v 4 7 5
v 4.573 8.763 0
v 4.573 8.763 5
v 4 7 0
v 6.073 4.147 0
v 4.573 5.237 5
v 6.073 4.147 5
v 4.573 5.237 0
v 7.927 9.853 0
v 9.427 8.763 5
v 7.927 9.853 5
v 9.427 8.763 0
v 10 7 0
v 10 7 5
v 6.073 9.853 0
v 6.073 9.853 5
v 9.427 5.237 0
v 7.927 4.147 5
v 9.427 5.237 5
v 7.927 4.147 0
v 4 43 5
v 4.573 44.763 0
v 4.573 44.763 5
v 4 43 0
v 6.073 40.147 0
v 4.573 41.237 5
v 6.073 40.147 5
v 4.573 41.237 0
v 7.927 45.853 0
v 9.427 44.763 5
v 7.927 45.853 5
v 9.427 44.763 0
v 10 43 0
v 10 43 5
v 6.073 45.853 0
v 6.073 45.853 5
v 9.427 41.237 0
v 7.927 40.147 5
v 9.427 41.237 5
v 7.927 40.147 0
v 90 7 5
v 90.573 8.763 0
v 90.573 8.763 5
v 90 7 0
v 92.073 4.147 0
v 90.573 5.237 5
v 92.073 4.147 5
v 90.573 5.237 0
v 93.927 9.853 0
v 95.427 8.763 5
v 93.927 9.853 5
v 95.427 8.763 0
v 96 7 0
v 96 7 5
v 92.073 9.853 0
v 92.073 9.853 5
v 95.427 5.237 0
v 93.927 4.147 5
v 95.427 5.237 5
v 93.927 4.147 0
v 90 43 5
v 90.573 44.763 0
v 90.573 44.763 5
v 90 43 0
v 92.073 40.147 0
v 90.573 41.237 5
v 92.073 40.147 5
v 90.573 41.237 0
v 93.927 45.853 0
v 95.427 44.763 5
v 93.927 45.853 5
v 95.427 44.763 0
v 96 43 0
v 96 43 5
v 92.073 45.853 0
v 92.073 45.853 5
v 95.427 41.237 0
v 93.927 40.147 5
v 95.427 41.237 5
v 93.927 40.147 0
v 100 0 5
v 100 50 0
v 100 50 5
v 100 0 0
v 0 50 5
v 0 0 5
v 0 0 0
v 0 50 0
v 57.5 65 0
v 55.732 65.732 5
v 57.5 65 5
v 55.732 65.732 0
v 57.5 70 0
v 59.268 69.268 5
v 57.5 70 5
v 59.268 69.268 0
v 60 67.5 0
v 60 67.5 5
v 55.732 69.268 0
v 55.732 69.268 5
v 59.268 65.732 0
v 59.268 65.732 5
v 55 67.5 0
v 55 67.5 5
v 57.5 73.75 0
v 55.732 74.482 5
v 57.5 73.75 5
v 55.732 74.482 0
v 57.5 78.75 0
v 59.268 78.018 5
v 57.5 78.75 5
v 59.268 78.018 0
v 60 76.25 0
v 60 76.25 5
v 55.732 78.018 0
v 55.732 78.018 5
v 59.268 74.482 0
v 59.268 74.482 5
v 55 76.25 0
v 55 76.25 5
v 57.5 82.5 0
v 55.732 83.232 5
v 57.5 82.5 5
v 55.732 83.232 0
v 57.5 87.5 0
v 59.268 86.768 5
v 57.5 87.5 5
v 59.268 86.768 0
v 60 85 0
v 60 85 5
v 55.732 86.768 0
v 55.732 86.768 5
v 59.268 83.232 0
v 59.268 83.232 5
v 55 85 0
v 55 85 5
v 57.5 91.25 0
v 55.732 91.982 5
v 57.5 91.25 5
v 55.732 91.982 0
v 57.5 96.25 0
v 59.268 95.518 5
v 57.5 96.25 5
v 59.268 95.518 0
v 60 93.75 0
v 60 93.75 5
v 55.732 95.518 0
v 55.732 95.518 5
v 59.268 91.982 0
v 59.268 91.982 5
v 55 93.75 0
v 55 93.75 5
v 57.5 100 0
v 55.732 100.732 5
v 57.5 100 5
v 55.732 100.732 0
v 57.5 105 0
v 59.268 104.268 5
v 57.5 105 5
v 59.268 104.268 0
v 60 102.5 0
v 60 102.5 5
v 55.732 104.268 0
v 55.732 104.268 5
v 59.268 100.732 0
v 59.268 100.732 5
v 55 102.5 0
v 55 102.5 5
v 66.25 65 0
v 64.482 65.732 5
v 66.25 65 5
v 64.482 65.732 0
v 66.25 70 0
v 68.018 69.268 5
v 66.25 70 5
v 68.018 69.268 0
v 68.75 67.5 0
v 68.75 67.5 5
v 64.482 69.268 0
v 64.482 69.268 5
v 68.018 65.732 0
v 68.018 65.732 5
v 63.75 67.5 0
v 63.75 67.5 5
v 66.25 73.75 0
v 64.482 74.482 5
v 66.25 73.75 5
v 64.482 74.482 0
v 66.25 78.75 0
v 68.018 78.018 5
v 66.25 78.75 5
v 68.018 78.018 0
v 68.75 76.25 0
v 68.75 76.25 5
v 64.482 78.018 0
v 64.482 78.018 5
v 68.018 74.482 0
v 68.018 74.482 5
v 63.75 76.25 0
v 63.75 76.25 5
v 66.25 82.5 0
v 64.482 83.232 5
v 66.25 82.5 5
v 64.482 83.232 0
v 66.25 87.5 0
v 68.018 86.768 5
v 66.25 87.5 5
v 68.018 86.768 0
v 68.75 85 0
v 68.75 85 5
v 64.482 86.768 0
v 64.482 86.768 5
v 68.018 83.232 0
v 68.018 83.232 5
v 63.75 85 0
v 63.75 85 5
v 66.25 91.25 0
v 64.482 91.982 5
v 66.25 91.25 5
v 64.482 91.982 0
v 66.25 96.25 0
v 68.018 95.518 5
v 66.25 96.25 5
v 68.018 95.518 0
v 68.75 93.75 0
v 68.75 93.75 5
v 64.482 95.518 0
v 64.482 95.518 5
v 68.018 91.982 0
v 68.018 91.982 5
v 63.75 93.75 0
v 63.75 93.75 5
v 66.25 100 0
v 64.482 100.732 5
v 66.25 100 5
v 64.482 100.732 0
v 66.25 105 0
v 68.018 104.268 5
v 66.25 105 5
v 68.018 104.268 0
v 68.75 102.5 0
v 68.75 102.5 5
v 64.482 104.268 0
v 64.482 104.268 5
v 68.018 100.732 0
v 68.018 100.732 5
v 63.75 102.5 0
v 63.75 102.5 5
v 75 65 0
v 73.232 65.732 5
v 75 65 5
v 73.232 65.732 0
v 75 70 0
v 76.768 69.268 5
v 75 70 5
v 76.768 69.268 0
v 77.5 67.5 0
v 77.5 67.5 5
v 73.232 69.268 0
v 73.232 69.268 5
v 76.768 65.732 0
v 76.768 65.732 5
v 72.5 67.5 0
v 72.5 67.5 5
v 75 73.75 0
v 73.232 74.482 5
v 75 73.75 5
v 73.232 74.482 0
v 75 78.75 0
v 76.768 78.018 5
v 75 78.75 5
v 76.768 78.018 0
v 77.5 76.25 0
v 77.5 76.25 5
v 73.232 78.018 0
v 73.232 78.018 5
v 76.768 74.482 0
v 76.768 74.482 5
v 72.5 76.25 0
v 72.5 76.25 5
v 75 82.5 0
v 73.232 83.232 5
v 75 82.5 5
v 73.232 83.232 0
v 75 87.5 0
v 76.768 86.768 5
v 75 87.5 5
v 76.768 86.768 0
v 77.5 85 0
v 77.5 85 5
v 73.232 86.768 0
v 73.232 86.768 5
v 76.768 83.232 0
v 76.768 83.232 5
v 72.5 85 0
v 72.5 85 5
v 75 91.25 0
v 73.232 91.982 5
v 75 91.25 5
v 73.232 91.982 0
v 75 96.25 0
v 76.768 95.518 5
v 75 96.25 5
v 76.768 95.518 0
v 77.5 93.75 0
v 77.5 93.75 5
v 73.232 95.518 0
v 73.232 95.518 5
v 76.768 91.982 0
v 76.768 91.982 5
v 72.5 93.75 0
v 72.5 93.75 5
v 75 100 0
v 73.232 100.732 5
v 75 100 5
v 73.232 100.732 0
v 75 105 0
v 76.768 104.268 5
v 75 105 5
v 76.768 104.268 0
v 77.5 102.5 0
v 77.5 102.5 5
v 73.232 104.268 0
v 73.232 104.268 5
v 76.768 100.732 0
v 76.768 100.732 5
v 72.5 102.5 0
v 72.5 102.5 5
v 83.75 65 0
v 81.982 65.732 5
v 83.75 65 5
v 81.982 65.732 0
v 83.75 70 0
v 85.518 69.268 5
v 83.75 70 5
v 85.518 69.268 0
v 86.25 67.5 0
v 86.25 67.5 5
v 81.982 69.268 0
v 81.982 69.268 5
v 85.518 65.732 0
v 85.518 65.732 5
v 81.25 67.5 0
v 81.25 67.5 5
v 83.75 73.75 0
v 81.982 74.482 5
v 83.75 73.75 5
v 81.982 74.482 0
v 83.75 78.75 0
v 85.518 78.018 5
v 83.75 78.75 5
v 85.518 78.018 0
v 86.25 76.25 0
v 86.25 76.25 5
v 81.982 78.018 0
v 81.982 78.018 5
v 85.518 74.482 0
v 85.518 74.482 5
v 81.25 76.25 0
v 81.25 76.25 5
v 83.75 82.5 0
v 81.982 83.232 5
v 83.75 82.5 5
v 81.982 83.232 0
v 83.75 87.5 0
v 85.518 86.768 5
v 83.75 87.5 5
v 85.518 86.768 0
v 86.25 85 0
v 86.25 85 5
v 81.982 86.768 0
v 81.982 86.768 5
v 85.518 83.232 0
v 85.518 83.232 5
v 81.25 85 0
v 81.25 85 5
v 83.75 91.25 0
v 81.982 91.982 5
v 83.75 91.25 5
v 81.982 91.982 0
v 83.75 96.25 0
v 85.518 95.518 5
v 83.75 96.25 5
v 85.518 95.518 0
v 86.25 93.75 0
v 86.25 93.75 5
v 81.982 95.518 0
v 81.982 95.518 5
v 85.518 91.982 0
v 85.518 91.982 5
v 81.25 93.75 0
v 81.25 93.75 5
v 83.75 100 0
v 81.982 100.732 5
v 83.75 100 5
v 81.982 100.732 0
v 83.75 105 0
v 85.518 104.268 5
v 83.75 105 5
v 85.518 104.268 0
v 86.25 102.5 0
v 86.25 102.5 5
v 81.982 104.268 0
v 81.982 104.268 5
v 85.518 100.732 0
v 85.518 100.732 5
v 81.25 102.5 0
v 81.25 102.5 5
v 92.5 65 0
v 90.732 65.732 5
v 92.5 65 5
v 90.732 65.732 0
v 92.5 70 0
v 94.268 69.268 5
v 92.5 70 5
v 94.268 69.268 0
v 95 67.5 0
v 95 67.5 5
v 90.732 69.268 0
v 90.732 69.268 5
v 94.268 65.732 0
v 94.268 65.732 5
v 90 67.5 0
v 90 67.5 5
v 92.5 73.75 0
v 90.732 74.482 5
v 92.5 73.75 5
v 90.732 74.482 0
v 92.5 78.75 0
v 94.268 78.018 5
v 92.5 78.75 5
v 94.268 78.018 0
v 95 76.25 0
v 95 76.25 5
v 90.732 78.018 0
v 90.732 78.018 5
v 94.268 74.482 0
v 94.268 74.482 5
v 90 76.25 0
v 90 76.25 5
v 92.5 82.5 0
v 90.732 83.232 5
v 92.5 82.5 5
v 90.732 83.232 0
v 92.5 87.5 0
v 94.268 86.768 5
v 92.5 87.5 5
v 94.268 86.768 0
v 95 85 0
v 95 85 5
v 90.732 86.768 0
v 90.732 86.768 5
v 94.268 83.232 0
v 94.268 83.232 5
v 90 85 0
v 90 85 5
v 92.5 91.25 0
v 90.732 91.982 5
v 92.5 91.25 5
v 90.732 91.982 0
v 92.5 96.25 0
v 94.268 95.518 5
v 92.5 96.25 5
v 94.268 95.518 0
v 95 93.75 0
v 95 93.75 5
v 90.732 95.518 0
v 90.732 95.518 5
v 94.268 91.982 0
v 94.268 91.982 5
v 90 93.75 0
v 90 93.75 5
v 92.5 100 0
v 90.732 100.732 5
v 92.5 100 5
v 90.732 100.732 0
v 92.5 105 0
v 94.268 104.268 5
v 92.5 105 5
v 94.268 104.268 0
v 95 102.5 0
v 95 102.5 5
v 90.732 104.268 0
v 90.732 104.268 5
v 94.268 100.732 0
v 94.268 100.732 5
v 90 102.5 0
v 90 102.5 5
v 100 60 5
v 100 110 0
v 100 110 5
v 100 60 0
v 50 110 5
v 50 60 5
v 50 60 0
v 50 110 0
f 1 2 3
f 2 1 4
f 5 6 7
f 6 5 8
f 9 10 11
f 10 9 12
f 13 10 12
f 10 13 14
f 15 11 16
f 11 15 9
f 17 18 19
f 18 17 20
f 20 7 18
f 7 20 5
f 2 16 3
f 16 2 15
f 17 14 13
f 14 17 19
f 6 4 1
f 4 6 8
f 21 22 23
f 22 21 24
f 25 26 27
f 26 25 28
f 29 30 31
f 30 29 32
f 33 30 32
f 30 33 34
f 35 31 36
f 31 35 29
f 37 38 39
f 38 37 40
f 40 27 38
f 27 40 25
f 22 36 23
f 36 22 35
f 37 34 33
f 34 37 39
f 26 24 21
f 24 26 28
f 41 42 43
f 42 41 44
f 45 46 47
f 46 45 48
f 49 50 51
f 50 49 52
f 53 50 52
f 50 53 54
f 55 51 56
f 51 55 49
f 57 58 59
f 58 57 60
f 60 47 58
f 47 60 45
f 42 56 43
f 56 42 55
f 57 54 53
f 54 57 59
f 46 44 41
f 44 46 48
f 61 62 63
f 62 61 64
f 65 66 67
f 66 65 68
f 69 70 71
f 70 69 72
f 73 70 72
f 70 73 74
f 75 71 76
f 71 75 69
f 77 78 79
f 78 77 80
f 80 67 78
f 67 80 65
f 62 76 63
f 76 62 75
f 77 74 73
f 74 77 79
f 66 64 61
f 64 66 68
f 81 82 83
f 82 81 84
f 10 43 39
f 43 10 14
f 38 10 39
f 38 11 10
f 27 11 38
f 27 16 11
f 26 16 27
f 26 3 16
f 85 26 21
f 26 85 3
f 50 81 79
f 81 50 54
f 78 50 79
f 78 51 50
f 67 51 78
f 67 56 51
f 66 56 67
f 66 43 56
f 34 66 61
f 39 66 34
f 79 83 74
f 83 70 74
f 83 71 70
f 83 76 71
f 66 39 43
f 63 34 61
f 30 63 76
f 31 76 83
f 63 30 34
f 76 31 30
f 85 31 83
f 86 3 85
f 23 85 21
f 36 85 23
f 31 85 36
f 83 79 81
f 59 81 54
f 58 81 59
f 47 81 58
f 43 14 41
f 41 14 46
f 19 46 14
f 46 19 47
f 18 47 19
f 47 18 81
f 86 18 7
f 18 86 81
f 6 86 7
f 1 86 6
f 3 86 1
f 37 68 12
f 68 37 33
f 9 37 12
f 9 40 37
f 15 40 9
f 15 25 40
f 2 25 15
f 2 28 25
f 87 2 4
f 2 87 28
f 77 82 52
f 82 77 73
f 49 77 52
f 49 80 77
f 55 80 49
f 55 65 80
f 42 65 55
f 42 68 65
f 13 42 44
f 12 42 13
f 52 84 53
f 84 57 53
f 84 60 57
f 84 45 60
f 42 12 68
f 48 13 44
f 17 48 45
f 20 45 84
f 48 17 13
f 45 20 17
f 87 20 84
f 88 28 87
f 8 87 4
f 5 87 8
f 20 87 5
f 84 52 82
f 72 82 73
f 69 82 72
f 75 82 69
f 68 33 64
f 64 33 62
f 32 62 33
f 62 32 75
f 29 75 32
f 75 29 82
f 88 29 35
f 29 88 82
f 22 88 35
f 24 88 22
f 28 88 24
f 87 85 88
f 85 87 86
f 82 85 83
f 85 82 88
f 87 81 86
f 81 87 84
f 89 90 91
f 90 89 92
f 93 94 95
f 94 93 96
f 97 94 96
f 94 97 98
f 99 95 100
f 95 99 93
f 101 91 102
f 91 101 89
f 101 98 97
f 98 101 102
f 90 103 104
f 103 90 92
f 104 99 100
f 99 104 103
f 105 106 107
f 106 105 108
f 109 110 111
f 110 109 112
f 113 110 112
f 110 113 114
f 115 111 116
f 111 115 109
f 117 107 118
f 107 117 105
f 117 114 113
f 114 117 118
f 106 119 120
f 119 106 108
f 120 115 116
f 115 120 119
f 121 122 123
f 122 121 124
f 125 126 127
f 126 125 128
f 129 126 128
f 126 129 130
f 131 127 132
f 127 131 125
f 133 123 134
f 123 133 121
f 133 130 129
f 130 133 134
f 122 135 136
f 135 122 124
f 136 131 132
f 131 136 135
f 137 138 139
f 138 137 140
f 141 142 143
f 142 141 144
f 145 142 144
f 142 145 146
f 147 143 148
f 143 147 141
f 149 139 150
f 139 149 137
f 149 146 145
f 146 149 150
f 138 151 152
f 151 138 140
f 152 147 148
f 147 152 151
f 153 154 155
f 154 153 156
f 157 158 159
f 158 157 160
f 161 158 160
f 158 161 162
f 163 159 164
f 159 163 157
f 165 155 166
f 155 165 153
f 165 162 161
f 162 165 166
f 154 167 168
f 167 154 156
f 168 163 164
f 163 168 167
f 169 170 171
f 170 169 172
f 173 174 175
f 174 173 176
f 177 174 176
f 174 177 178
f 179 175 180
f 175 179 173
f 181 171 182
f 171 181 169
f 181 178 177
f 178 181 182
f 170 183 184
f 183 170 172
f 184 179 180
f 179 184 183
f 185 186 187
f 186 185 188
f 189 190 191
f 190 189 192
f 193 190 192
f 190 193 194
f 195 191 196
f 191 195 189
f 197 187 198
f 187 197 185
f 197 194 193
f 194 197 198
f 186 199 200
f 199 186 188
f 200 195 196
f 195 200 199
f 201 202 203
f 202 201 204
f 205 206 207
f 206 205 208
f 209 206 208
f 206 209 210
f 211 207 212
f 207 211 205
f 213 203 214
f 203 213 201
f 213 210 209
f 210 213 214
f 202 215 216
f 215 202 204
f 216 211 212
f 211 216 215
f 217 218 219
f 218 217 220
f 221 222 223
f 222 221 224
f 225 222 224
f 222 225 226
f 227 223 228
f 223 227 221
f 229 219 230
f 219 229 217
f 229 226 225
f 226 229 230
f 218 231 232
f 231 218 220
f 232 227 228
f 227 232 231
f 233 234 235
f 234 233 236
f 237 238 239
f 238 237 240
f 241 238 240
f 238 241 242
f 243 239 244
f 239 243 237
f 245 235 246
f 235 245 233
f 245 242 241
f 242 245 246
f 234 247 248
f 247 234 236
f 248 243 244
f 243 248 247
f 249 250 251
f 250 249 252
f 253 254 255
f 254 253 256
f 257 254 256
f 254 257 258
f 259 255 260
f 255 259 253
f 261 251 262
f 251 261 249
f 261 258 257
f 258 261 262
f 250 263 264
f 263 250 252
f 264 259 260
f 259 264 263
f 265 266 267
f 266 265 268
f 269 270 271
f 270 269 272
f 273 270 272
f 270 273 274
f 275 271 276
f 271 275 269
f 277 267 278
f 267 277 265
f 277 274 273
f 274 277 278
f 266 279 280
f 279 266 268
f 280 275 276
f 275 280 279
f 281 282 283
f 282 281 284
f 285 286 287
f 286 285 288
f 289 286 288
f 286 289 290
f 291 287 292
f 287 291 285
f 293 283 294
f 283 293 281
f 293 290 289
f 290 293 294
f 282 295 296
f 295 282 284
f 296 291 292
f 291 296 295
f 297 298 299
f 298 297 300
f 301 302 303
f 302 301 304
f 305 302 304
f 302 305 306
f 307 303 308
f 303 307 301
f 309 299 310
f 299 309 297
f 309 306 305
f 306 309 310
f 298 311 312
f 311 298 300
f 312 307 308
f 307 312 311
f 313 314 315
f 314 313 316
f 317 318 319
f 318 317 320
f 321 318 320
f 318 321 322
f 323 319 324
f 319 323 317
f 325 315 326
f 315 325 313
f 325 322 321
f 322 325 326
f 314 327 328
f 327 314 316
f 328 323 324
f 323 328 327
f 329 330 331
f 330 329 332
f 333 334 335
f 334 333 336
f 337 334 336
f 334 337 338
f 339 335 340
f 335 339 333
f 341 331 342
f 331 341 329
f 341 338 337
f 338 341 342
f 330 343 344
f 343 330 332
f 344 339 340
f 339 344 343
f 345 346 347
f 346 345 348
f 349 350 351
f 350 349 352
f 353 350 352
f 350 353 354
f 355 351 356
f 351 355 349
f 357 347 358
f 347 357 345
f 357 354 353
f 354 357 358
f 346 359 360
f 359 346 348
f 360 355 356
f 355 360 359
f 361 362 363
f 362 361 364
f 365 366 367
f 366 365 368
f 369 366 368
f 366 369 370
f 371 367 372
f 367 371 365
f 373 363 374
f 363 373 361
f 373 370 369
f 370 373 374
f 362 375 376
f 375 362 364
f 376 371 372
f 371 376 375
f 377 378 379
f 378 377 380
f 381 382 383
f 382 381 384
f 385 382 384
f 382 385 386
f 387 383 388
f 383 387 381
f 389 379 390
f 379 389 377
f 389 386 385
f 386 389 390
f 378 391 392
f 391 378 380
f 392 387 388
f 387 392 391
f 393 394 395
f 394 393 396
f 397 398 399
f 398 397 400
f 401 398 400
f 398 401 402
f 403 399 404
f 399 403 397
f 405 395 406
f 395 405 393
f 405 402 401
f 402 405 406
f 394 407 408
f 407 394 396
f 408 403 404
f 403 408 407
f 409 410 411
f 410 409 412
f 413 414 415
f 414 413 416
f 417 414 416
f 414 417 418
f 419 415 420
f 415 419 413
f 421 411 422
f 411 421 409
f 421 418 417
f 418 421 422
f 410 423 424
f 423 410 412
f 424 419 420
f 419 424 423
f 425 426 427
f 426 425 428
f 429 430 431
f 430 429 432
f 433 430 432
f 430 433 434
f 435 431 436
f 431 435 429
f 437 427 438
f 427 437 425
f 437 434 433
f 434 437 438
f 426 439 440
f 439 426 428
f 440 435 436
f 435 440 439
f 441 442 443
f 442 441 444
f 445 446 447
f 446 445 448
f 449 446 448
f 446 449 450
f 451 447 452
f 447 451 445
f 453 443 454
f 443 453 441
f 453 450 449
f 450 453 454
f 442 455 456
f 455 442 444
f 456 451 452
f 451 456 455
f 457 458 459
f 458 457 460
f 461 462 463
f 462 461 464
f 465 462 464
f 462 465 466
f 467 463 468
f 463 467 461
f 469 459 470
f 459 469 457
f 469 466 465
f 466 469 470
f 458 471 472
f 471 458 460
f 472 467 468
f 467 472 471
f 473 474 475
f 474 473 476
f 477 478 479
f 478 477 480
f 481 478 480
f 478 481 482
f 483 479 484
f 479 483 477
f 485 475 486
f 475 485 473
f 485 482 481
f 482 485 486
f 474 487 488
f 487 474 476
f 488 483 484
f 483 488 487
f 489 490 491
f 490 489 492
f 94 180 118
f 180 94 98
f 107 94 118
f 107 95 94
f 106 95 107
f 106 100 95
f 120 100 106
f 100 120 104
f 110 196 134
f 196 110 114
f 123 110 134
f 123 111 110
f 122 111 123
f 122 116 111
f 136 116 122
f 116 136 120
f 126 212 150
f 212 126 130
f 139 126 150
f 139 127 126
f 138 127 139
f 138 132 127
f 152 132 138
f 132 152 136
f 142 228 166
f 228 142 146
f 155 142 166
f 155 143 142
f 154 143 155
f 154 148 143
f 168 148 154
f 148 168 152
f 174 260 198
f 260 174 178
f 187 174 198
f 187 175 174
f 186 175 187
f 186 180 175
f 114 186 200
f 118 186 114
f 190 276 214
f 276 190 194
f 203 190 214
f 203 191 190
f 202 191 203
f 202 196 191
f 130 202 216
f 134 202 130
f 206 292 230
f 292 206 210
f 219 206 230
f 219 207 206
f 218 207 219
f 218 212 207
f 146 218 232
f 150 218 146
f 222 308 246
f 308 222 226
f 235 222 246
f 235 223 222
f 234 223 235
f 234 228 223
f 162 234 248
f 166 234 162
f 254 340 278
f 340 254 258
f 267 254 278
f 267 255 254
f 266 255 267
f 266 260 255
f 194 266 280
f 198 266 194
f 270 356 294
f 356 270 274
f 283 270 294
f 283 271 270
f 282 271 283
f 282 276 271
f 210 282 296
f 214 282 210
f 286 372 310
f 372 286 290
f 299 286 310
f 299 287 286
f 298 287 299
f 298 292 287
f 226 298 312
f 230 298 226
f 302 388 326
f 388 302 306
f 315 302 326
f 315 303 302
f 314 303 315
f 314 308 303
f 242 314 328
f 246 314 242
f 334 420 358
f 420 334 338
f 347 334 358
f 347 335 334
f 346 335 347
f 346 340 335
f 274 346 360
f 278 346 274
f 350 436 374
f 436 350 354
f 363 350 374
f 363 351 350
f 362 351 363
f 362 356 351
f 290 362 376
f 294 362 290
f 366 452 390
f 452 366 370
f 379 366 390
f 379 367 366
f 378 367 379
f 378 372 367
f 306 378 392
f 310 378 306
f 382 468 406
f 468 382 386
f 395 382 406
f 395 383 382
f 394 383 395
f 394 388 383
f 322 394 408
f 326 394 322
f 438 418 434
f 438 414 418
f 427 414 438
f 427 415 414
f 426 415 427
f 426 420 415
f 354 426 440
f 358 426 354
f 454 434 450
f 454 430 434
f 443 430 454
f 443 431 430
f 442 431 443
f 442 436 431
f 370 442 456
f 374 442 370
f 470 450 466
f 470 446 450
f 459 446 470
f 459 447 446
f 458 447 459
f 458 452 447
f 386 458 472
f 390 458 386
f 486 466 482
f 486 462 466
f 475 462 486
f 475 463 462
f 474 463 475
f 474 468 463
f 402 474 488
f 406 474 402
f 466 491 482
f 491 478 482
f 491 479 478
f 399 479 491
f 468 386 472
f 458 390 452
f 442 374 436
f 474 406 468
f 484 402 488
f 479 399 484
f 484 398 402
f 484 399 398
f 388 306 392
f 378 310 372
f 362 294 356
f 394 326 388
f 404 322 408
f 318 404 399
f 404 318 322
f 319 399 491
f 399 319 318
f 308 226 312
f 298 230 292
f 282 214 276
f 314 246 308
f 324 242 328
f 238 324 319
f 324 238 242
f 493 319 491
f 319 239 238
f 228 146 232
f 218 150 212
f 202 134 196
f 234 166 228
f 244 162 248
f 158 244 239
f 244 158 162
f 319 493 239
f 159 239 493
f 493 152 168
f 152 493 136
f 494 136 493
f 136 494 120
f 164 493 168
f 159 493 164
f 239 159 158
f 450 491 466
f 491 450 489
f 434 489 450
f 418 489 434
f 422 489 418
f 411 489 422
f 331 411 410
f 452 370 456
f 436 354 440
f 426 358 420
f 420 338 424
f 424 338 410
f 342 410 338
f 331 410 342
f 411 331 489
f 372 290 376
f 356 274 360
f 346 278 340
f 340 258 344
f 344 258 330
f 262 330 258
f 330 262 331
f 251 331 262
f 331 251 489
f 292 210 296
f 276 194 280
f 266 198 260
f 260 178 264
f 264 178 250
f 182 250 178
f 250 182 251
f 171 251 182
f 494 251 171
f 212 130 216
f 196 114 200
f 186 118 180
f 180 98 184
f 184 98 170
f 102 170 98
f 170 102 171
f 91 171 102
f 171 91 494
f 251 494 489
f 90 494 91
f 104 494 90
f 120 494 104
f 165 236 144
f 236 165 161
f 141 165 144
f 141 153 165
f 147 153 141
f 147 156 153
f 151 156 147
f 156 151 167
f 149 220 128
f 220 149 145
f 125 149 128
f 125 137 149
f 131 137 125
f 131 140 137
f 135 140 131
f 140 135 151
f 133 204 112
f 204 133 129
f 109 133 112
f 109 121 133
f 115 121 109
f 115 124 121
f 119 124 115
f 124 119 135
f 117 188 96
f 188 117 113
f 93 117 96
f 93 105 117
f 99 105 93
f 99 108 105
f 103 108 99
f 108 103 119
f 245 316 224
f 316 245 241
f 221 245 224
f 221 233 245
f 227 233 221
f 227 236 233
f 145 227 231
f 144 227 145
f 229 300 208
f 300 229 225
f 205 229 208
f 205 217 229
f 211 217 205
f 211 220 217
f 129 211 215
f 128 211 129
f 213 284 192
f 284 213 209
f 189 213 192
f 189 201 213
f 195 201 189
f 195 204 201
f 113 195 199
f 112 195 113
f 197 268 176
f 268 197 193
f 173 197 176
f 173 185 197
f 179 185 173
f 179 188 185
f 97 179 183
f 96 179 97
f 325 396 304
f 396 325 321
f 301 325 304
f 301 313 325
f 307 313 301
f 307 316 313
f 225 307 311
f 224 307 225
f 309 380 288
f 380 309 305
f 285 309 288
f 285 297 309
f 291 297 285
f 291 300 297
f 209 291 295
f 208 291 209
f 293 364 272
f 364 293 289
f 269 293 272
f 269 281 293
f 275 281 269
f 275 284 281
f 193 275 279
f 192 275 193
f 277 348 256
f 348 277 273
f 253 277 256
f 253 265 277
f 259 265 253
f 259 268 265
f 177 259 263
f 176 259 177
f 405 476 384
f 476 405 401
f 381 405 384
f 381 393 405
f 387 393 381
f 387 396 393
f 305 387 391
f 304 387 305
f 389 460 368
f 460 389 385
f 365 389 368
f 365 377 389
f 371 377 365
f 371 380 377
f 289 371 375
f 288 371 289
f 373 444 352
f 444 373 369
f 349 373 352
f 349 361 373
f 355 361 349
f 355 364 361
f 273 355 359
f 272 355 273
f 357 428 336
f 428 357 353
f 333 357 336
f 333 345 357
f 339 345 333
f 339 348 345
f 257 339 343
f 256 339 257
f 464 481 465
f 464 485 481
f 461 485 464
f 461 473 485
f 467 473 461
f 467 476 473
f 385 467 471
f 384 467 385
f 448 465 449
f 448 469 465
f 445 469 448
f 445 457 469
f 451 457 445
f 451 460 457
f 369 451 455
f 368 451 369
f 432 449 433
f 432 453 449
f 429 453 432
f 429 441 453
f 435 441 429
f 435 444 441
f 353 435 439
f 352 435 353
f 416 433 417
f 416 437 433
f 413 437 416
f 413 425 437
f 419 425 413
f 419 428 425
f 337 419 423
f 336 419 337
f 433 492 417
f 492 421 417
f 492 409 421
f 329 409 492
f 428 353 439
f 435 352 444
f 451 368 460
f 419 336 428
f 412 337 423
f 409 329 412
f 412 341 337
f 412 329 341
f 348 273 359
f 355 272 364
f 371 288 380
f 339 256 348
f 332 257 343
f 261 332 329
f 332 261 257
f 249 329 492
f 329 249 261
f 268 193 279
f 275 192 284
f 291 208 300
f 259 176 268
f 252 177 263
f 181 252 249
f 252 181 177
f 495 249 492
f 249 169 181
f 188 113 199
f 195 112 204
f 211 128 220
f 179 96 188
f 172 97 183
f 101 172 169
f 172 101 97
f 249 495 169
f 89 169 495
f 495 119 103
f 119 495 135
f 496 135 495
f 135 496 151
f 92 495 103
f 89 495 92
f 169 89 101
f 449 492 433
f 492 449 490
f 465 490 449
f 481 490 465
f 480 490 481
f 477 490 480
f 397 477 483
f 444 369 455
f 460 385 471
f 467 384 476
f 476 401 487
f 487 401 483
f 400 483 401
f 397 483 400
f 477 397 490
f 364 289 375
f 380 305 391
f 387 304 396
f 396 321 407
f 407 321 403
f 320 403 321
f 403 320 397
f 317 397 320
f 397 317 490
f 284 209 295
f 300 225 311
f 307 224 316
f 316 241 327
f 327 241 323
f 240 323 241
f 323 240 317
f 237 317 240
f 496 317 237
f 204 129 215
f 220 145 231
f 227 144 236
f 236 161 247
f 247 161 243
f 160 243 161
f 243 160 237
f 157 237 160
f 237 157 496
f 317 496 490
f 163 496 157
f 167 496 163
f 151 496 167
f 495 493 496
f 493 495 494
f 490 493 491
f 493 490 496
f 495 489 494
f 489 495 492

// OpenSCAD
module peg_board( size, hole_dm, hole_margin, hole_count = [2,2]) {

	difference() {

		cube( size );

		abs_margin  = hole_margin + hole_dm / 2;

		x_hole_dist = hole_count.x > 1 ? 
		              (size.x - 2 * abs_margin) / (hole_count.x - 1) : 0;

		y_hole_dist = hole_count.y > 1 ? 
		              (size.y - 2 * abs_margin) / (hole_count.y - 1) : 0;

		x_values    = hole_count.x > 1 ? 
					  [abs_margin : x_hole_dist : size.x - abs_margin + 0.1] :
				  	  [size.x / 2];

		y_values    = hole_count.y > 1 ?
		              [abs_margin : y_hole_dist : size.y - abs_margin + 0.1] :
		              [size.y / 2];

		// holes
		for (x = x_values, y = y_values)
	    translate( [x, y, -1] )
	    color( "red" )
	    cylinder( d = hole_dm, h = size.z + 5);

	}

}

peg_board( [100,50,5], hole_dm = 6, hole_margin = 4);

translate( [50,60,0] )
peg_board( [50,50,5], hole_dm = 5, hole_margin = 5, hole_count = [5,5]);
